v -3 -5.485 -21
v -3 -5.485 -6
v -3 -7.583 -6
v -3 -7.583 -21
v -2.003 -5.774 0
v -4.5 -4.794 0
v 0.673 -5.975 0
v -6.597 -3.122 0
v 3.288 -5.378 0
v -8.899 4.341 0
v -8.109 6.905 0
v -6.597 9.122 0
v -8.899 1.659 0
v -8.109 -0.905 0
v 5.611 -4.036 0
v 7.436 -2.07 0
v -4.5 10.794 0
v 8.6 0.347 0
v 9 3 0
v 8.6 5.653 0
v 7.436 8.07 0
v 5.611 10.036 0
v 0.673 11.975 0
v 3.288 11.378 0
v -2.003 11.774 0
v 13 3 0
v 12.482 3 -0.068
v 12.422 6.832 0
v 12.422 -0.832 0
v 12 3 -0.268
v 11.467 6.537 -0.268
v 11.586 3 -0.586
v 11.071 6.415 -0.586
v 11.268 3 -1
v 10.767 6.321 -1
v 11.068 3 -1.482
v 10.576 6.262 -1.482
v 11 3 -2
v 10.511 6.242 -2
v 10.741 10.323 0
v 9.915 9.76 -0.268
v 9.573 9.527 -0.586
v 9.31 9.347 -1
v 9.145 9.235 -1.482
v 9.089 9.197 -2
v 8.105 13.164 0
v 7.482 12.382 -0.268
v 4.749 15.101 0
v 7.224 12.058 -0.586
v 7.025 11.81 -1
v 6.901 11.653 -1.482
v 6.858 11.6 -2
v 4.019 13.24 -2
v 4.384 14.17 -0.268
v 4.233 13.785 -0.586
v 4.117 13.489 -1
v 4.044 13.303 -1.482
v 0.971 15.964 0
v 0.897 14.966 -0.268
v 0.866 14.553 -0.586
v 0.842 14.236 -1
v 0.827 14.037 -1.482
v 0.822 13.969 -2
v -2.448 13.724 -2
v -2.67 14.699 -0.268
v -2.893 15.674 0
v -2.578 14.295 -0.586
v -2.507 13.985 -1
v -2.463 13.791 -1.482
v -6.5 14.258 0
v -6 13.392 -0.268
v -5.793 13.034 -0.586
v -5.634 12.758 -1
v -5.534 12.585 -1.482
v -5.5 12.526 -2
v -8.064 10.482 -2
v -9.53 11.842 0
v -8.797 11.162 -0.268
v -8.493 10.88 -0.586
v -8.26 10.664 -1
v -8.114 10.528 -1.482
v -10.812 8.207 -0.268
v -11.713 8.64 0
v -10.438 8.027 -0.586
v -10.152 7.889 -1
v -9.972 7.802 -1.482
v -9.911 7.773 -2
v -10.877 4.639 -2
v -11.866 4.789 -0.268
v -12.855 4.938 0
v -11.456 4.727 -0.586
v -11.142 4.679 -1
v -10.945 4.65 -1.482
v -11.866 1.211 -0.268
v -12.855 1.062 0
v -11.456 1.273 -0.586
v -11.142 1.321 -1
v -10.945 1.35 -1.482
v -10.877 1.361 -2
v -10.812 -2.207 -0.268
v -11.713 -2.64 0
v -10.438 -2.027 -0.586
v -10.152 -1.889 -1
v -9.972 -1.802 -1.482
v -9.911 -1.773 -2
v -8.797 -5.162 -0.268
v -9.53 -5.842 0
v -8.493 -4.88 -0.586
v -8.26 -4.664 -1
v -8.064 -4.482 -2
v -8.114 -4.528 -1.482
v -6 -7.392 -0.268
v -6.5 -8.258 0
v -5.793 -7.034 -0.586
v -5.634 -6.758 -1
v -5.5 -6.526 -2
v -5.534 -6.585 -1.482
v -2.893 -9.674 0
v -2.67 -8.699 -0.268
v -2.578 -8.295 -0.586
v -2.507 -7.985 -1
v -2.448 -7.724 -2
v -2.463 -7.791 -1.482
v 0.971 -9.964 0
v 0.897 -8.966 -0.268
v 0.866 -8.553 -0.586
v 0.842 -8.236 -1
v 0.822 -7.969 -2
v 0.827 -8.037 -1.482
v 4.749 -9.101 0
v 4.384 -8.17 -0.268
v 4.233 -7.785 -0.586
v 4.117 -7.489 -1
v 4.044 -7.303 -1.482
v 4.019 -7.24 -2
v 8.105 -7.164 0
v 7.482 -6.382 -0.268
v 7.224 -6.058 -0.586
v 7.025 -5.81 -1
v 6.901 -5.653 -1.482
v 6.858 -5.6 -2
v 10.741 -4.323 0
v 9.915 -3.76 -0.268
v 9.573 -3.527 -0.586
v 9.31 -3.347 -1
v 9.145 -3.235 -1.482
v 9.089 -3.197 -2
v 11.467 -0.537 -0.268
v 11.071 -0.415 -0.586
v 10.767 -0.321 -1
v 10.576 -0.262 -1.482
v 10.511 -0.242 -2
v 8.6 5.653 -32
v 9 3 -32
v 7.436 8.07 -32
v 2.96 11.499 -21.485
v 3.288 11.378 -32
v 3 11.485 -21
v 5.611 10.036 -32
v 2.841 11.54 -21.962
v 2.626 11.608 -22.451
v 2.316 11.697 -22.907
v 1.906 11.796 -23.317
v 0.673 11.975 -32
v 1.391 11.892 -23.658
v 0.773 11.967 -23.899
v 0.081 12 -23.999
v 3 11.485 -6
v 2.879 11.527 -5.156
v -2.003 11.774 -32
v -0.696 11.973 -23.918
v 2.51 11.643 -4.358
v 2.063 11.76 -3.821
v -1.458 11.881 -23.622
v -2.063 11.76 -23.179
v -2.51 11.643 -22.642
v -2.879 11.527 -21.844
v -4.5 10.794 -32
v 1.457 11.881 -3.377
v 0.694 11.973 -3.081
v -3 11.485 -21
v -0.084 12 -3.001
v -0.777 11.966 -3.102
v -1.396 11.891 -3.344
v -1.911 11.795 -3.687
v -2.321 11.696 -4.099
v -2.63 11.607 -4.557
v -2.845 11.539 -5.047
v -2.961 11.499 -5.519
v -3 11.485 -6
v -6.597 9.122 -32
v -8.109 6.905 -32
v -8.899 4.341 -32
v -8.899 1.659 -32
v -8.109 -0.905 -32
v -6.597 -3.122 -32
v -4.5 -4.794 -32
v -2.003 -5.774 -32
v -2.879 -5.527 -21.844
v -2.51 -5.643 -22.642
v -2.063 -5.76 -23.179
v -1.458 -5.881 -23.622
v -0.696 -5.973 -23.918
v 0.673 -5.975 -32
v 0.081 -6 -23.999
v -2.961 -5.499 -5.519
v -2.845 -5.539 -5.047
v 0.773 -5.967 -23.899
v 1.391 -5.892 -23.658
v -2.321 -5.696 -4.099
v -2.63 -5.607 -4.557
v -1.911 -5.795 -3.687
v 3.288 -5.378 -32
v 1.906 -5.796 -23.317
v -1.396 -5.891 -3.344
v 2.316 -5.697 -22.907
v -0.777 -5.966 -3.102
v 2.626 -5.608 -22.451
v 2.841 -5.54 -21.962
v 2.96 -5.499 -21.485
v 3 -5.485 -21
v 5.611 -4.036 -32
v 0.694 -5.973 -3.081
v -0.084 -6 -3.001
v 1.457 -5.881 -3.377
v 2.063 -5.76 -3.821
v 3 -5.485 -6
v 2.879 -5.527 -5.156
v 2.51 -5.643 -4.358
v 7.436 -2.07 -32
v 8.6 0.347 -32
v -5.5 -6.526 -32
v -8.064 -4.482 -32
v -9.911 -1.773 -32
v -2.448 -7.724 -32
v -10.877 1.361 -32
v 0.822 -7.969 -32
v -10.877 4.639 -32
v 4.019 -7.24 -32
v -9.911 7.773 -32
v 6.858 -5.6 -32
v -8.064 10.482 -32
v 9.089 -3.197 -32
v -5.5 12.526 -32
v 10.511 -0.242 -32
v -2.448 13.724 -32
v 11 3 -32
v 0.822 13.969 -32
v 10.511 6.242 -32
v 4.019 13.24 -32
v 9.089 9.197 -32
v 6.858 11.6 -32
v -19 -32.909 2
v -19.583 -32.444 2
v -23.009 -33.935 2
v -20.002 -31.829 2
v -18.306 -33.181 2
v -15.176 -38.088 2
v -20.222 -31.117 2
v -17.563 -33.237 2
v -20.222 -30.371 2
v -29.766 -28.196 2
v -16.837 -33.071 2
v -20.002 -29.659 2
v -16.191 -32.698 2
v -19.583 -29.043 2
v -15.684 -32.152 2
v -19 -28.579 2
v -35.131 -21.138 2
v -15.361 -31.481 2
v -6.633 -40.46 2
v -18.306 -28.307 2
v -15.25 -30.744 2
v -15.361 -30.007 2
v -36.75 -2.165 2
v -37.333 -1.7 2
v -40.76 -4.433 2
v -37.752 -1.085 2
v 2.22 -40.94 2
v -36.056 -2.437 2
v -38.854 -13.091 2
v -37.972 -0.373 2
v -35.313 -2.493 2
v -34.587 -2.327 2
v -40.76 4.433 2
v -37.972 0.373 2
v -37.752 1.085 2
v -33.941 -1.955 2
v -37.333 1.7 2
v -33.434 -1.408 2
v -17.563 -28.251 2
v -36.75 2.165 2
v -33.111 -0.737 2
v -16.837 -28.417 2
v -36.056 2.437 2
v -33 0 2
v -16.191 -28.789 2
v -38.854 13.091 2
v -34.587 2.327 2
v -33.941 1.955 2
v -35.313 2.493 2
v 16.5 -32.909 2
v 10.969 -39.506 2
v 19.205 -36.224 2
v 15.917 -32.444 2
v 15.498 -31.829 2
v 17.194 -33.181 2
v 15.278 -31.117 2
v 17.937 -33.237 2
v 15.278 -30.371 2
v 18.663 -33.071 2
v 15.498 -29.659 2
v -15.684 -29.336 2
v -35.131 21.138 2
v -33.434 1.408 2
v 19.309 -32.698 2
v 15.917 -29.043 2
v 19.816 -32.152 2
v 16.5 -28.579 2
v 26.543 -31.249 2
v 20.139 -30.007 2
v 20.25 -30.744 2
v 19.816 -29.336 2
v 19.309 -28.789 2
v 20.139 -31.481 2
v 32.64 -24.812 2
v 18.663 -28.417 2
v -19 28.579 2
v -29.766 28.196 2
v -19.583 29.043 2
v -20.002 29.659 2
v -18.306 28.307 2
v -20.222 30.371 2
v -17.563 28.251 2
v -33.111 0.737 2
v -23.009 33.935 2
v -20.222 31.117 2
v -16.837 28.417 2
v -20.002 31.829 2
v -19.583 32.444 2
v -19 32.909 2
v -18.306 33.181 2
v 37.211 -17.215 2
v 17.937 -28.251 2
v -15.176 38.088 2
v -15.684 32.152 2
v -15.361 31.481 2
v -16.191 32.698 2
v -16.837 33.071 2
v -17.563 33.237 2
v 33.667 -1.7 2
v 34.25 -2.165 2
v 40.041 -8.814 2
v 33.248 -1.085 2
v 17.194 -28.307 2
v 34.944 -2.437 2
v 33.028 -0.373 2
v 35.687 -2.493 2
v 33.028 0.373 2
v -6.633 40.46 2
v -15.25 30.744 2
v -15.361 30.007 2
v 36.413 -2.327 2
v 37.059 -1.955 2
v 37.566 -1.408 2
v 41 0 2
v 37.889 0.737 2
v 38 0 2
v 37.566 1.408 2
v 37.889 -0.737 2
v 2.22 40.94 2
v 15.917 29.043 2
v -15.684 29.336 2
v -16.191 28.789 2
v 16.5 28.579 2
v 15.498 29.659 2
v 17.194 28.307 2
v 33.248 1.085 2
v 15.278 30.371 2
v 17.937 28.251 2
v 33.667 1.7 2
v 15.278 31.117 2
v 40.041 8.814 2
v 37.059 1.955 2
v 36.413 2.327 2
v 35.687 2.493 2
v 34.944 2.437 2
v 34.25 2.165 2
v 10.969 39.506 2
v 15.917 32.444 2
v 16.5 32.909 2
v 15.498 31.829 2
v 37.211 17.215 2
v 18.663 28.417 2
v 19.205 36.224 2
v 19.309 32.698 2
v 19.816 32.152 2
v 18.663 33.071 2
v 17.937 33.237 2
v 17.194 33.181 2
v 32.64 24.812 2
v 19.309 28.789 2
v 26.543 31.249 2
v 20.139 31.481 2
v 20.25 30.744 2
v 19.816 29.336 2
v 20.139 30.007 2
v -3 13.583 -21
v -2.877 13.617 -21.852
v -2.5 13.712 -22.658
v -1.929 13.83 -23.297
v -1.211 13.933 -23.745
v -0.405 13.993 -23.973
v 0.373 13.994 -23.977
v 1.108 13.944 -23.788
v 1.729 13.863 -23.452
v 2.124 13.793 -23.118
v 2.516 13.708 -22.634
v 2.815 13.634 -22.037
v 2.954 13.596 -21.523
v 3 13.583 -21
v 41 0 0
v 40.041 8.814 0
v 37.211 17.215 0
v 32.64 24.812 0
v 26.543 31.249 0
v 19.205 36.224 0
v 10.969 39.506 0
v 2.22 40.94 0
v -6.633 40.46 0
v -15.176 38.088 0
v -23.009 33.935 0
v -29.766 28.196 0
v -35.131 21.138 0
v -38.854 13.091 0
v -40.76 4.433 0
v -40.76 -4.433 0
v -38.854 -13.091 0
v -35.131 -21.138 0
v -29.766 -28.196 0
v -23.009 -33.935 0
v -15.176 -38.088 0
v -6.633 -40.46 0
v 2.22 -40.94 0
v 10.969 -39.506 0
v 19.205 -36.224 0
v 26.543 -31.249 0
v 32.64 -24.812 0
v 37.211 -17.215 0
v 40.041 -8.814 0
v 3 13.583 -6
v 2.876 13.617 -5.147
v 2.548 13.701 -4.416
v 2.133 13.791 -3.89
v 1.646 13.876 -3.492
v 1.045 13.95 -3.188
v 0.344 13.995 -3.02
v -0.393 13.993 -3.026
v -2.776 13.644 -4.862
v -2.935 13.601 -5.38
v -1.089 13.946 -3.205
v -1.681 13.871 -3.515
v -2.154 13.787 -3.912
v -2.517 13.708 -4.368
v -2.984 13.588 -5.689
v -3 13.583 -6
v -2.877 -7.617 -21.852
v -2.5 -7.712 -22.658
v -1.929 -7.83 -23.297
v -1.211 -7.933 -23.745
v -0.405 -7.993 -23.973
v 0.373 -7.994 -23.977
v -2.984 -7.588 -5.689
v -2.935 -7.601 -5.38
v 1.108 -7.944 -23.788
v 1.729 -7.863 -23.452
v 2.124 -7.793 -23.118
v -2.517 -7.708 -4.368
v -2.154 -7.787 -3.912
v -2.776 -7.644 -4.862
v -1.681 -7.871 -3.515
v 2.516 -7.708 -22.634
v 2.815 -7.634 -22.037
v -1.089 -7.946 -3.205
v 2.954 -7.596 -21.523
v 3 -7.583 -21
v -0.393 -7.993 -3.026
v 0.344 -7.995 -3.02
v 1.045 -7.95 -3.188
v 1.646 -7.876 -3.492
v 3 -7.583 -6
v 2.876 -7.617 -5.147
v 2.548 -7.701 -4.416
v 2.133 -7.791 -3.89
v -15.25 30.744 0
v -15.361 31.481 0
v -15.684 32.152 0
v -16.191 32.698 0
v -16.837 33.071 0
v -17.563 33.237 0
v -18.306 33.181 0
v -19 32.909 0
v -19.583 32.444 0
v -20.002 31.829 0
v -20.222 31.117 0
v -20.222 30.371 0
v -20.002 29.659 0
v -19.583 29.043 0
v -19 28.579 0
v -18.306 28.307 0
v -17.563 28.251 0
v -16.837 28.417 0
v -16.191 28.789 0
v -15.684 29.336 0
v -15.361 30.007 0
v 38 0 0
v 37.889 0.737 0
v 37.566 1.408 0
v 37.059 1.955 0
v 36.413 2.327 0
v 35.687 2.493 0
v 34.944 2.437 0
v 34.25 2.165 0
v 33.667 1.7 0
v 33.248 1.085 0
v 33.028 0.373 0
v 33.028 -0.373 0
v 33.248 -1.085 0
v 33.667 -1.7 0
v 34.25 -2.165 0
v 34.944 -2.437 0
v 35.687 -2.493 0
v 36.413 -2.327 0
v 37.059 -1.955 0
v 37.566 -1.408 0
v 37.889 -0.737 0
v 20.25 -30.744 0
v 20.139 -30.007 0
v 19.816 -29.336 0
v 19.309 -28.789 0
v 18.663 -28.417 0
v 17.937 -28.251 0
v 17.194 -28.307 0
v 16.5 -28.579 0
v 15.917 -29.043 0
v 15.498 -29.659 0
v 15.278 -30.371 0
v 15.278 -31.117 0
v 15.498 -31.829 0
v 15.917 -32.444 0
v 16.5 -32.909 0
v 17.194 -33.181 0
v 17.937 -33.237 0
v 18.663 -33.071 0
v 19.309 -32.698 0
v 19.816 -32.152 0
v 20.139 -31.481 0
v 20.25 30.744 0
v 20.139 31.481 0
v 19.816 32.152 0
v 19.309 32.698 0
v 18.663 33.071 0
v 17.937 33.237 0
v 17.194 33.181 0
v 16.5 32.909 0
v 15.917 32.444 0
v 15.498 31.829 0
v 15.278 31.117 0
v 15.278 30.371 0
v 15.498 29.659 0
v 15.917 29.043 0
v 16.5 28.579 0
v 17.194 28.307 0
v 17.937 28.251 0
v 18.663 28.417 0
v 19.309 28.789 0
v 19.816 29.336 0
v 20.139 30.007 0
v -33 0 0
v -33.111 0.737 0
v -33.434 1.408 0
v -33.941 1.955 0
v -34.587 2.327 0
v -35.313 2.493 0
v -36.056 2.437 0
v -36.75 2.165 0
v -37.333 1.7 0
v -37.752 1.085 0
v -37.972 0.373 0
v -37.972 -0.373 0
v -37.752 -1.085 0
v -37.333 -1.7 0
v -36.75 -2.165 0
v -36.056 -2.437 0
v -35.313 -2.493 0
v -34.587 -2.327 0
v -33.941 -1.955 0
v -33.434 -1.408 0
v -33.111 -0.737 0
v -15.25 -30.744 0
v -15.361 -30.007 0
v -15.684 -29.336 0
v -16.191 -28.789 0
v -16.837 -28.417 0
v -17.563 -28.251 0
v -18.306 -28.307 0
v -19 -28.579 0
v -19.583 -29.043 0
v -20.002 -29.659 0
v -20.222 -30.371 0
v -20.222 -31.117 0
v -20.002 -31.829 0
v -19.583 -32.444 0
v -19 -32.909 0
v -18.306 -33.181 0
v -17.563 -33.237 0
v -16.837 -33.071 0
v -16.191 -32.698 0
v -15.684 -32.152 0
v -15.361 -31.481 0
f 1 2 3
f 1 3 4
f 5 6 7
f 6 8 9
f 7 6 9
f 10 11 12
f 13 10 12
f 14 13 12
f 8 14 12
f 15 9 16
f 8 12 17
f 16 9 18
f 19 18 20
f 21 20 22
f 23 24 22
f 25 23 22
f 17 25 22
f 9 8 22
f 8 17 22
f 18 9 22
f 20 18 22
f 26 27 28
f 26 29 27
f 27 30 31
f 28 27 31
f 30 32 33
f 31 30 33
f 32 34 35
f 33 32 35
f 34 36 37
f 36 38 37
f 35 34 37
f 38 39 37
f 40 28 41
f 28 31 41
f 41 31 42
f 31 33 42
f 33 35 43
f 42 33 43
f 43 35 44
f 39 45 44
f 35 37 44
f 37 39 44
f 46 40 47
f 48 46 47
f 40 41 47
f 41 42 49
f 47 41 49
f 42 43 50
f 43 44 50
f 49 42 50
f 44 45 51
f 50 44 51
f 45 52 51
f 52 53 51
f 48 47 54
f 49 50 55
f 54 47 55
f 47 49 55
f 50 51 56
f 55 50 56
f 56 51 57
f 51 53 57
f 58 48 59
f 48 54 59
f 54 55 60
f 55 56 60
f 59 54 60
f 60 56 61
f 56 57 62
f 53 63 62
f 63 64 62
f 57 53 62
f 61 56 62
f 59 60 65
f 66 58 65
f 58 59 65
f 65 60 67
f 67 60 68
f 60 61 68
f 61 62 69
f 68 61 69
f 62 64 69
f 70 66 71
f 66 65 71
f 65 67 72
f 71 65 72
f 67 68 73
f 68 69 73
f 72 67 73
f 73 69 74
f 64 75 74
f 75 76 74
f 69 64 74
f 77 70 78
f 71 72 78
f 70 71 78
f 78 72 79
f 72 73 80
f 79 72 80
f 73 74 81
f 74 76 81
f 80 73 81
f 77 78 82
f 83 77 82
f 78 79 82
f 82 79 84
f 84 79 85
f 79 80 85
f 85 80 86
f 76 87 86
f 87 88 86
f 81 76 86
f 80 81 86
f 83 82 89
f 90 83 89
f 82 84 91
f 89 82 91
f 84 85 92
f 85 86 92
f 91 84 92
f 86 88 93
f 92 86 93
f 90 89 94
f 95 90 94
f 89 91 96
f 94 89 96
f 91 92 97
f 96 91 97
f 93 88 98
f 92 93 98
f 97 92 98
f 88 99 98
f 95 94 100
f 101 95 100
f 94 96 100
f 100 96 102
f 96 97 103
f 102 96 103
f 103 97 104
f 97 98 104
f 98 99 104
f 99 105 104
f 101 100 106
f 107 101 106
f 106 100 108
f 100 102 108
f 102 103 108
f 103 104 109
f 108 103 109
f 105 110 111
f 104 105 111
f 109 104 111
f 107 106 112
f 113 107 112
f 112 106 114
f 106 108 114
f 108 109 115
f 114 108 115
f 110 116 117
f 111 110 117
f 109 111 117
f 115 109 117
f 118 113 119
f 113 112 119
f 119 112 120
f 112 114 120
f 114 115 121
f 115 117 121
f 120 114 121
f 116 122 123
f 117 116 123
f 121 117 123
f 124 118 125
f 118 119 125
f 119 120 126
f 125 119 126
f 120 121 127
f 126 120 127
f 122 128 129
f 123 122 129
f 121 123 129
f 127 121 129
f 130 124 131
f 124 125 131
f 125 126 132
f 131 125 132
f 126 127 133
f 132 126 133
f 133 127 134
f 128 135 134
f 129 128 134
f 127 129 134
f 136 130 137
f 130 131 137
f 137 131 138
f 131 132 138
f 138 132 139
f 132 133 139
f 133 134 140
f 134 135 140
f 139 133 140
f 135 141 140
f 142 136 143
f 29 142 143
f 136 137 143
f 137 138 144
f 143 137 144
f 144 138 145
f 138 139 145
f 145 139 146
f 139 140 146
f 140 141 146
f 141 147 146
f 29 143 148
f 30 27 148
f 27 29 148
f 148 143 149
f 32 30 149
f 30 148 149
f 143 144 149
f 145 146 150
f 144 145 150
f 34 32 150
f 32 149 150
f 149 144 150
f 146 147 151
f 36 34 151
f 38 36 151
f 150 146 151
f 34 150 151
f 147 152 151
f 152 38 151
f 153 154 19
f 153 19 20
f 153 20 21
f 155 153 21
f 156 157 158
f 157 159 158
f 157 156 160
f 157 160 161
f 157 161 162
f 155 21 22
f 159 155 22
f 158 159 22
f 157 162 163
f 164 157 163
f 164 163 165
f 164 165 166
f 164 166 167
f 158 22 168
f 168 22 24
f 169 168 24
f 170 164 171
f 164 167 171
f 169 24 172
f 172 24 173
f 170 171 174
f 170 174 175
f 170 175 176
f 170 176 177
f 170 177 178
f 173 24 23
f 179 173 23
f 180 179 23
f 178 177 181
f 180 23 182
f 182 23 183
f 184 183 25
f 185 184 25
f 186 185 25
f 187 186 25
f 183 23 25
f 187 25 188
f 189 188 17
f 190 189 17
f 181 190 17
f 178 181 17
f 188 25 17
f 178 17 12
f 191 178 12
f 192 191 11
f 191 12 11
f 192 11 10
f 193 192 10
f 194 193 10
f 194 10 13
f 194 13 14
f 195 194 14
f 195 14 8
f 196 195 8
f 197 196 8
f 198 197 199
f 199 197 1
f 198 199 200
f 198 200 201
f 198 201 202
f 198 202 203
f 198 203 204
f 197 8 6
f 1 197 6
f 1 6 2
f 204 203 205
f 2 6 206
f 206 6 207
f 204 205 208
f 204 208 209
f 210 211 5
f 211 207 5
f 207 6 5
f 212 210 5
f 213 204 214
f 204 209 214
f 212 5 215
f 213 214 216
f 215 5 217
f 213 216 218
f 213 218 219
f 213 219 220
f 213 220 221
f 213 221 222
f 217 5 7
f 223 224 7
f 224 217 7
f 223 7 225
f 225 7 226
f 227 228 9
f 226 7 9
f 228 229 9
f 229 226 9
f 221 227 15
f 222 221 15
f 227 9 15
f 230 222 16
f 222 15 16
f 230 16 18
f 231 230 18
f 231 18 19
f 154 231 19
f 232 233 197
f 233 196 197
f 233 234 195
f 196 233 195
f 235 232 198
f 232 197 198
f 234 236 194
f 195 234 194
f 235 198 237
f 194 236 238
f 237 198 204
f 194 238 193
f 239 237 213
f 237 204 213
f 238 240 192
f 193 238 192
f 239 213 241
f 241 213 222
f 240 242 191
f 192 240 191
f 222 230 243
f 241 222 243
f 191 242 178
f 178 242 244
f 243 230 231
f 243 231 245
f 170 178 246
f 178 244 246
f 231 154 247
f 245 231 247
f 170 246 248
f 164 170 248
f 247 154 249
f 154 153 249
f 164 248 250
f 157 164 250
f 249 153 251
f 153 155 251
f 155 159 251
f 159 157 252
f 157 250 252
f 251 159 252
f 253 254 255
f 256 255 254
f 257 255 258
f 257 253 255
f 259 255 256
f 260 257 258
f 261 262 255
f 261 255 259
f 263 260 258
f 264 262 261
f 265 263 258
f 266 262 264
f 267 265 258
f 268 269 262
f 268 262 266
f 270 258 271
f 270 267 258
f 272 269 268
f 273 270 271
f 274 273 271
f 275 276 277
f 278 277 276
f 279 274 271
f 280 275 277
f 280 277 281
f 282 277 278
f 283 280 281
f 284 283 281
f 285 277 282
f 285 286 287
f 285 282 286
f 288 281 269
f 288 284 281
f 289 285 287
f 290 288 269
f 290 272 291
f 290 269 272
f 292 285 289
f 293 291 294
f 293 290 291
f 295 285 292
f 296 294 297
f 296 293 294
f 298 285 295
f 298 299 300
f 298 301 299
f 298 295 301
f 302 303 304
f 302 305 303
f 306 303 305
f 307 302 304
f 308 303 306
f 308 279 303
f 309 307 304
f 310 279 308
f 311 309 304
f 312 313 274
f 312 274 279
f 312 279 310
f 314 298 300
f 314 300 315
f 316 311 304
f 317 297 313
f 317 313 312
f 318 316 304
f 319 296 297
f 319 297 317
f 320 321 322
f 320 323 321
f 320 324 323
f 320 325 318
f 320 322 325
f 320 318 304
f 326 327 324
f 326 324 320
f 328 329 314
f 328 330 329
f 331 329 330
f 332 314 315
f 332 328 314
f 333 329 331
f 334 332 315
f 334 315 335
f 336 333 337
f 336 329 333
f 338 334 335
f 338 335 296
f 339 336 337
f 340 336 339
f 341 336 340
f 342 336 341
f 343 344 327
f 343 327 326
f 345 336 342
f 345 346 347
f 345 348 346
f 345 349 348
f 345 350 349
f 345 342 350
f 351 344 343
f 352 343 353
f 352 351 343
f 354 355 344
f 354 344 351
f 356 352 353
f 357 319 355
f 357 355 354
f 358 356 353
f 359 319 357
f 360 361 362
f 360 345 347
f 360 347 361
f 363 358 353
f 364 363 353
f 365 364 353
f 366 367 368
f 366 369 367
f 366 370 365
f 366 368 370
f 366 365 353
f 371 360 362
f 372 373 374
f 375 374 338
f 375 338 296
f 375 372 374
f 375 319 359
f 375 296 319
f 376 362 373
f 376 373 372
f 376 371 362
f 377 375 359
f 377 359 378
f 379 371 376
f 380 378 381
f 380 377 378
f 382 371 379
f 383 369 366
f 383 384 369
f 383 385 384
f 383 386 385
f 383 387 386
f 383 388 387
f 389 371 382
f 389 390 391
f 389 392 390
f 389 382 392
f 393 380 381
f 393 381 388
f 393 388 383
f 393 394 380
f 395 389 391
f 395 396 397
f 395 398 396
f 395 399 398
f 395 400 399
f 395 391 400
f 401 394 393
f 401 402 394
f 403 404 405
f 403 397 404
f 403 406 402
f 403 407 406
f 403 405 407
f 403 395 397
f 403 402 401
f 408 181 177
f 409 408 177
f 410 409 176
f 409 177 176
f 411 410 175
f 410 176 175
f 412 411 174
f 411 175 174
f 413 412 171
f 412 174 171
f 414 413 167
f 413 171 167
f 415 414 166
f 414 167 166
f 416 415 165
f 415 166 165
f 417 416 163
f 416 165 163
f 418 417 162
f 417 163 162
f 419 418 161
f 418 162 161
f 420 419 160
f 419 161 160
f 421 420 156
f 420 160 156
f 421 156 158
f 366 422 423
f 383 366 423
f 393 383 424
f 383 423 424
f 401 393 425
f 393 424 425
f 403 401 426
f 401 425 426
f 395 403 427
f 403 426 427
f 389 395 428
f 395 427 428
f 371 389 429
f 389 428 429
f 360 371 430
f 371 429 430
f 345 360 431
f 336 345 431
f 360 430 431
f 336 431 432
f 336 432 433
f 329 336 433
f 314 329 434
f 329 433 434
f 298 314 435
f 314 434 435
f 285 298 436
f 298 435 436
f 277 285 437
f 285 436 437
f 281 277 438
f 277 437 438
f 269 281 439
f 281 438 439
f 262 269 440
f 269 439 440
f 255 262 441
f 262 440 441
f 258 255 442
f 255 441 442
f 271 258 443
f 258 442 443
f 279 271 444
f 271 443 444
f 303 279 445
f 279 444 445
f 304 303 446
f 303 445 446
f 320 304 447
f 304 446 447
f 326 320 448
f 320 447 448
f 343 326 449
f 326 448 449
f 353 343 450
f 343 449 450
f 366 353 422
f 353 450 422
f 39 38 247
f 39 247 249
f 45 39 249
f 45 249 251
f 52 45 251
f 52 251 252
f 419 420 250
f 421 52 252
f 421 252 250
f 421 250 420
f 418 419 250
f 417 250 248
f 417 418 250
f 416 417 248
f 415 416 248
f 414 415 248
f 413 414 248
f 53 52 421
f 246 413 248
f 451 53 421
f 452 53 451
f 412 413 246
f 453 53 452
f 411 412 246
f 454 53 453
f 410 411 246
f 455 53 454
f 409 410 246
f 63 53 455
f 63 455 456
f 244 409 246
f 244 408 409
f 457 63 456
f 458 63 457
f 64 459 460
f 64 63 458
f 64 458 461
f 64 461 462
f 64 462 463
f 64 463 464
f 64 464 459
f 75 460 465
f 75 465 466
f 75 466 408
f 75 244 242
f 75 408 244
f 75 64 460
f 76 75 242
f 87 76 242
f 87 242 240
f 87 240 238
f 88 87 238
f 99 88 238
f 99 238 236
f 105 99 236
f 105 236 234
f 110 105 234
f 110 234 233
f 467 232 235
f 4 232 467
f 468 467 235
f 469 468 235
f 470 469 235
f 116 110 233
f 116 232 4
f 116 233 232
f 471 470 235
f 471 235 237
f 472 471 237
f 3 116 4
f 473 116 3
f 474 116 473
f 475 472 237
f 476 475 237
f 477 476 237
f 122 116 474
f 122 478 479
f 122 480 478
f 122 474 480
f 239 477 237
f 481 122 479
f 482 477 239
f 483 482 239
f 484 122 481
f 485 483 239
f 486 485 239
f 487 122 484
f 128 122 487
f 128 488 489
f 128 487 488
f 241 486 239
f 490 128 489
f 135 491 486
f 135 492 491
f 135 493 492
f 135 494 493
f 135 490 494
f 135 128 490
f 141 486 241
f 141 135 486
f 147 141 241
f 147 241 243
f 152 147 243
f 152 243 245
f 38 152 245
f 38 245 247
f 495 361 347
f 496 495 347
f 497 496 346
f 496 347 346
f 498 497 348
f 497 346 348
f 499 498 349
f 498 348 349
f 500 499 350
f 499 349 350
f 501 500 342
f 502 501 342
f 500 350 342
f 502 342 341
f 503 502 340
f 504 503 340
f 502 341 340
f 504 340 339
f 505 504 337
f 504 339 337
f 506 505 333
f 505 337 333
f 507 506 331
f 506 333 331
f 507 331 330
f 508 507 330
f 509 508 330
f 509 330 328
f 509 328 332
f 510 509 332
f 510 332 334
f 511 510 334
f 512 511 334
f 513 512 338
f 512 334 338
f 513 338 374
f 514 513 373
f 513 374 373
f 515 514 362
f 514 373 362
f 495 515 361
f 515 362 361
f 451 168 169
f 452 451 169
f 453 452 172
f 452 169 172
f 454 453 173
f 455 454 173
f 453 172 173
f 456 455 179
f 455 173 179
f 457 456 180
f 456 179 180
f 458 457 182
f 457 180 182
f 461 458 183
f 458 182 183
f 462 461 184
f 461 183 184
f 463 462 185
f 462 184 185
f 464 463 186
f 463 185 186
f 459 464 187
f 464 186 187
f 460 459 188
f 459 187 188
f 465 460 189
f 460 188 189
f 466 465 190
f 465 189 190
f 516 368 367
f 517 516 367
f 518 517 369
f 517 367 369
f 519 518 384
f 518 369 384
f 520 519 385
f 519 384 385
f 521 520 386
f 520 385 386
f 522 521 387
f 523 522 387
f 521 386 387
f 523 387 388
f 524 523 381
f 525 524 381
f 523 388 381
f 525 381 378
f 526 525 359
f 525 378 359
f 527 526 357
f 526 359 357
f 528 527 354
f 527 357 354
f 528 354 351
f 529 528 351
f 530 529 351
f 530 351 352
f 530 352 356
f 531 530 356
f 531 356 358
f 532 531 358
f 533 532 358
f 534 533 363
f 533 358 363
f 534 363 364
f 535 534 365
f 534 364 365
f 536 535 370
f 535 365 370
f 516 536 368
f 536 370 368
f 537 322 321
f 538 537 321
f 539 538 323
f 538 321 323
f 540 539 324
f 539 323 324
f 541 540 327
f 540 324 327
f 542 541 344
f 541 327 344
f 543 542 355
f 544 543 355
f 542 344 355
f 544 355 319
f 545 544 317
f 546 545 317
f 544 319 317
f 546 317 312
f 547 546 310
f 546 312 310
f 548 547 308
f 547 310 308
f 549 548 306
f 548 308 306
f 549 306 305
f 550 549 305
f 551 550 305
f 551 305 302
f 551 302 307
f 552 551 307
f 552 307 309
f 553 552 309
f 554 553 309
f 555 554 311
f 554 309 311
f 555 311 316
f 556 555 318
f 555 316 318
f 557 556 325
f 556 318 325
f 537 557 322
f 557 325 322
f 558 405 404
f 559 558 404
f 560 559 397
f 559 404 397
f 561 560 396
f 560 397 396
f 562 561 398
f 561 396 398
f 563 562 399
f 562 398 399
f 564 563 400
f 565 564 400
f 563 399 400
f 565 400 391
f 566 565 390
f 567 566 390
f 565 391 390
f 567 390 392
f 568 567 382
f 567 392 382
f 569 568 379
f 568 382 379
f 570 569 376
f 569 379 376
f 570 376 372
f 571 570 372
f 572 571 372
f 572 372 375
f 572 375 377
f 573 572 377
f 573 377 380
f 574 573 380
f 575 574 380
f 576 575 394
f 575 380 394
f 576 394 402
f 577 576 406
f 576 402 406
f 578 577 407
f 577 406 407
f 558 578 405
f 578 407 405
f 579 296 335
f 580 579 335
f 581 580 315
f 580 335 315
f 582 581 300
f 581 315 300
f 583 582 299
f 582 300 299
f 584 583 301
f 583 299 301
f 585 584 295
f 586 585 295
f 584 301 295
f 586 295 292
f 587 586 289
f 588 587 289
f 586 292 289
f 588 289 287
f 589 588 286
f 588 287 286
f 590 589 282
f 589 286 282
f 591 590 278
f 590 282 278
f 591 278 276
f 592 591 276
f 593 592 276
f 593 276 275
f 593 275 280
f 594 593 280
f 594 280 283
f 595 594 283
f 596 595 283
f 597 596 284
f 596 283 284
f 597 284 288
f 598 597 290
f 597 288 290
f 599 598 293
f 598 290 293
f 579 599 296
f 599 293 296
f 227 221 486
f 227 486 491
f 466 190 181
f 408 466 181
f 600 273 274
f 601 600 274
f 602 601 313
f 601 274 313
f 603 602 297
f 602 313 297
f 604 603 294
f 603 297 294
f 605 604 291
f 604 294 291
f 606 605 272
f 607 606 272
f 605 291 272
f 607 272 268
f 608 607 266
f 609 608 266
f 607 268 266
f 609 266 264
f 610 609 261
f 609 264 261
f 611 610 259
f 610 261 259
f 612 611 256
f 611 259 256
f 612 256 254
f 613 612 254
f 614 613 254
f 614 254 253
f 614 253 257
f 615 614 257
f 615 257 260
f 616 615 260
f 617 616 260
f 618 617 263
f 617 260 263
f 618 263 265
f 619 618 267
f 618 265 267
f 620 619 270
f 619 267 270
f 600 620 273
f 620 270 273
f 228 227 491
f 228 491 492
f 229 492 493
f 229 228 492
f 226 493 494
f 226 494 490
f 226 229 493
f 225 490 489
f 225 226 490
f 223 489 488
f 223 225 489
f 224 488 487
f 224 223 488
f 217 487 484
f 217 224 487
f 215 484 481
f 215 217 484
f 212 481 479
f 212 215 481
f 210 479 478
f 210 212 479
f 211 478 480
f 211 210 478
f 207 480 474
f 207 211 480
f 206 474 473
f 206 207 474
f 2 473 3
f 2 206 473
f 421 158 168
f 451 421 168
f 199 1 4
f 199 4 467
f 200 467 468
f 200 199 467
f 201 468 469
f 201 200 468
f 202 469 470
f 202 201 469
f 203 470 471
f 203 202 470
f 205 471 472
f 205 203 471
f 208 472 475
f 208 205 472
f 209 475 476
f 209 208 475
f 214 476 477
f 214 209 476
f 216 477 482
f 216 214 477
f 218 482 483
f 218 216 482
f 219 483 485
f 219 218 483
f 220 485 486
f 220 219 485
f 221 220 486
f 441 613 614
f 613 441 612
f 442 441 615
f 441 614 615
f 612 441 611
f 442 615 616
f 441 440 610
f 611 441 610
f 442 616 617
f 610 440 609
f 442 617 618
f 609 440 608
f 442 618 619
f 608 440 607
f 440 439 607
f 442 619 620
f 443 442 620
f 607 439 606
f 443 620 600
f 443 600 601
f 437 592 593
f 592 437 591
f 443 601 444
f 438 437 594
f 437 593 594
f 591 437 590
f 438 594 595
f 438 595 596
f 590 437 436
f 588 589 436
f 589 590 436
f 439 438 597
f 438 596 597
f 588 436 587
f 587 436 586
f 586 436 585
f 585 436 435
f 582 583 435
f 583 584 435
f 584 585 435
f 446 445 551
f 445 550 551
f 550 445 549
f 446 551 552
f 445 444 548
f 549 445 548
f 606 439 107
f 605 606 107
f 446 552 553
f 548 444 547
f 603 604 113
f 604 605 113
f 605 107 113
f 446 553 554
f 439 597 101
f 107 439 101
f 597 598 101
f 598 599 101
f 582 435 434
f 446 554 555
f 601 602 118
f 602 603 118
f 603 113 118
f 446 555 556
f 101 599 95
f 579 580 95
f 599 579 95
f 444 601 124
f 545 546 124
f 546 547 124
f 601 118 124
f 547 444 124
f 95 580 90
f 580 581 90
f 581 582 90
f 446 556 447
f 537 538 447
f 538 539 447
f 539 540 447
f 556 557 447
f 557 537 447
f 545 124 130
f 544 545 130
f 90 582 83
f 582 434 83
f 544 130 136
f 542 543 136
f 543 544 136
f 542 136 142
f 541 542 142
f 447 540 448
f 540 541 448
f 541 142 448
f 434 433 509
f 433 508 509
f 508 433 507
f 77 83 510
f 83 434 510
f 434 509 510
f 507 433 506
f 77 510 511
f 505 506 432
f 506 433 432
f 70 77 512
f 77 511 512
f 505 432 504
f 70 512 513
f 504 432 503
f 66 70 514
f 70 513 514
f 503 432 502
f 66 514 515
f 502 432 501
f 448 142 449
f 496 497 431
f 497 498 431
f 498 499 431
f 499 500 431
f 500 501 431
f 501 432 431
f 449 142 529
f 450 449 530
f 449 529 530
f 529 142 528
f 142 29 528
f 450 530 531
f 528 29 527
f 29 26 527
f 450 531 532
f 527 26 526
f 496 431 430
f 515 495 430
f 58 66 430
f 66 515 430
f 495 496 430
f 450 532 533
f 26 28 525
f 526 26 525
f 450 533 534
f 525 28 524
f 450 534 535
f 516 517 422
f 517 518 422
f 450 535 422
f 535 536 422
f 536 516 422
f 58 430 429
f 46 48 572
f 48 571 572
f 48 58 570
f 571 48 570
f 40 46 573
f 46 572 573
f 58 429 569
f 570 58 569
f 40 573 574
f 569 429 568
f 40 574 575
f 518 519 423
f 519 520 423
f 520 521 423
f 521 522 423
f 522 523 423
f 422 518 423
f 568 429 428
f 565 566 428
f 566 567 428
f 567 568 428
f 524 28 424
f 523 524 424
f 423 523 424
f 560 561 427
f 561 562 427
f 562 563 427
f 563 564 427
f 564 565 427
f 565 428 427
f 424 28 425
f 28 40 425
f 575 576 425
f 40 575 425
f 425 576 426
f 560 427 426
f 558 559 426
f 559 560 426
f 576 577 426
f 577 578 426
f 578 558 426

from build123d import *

# Parameters (mm, degrees)
SKETCH1_R               = 11
SKETCH1_R_2             = 9
BOSS_EXTRUDE1_DEPTH     = 32
CUT_EXTRUDE1_DEPTH      = 15
CUT_EXTRUDE1_DEPTH_BACK = 9
SKETCH3_R               = 41
BOSS_EXTRUDE2_DEPTH     = 2
FILLET1_R               = 2
SKETCH4_R               = 2.5
CUT_EXTRUDE2_DEPTH      = 2


with BuildPart() as part:
    # Sketch1 → Boss-Extrude1 (new body)
    with BuildSketch(Plane.XY):
        with Locations((0, 3)):
            Circle(SKETCH1_R)
        with Locations((0, 3)):
            Circle(SKETCH1_R_2, mode=Mode.SUBTRACT)
    extrude(amount=-BOSS_EXTRUDE1_DEPTH)

    # Sketch2 → Cut-Extrude1 (cut, two sides)
    with BuildSketch(Plane(origin=(0, 0, 0), x_dir=(1, 0, 0), z_dir=(0, 1, 0))) as cut_extrude1_sk:
        with BuildLine():
            Line((3, 21), (3, 6))
            ThreePointArc((3, 6), (0, 3), (-3, 6))
            Line((-3, 6), (-3, 21))
            ThreePointArc((-3, 21), (0, 24), (3, 21))
        make_face()
    extrude(amount=CUT_EXTRUDE1_DEPTH, mode=Mode.SUBTRACT)
    extrude(cut_extrude1_sk.sketch, amount=-CUT_EXTRUDE1_DEPTH_BACK, mode=Mode.SUBTRACT)

    # Sketch3 → Boss-Extrude2 (add)
    with BuildSketch(Plane.XY):
        Circle(SKETCH3_R)
    extrude(amount=BOSS_EXTRUDE2_DEPTH)

    # Fillet1
    fillet1_edges = [part.edges().sort_by_distance(p)[0] for p in [
        (-11, 3, 0),
    ]]
    fillet(fillet1_edges, radius=FILLET1_R)

    # Sketch4 → Cut-Extrude2 (cut)
    with BuildSketch(Plane.XY.offset(2)):
        with Locations((35.5, 0)):
            Circle(SKETCH4_R)
        with Locations((17.75, -30.743901834)):
            Circle(SKETCH4_R)
        with Locations((-17.75, -30.743901834)):
            Circle(SKETCH4_R)
        with Locations((-35.5, 0)):
            Circle(SKETCH4_R)
        with Locations((-17.75, 30.743901834)):
            Circle(SKETCH4_R)
        with Locations((17.75, 30.743901834)):
            Circle(SKETCH4_R)
    extrude(amount=-CUT_EXTRUDE2_DEPTH, mode=Mode.SUBTRACT)


solid = part.part
